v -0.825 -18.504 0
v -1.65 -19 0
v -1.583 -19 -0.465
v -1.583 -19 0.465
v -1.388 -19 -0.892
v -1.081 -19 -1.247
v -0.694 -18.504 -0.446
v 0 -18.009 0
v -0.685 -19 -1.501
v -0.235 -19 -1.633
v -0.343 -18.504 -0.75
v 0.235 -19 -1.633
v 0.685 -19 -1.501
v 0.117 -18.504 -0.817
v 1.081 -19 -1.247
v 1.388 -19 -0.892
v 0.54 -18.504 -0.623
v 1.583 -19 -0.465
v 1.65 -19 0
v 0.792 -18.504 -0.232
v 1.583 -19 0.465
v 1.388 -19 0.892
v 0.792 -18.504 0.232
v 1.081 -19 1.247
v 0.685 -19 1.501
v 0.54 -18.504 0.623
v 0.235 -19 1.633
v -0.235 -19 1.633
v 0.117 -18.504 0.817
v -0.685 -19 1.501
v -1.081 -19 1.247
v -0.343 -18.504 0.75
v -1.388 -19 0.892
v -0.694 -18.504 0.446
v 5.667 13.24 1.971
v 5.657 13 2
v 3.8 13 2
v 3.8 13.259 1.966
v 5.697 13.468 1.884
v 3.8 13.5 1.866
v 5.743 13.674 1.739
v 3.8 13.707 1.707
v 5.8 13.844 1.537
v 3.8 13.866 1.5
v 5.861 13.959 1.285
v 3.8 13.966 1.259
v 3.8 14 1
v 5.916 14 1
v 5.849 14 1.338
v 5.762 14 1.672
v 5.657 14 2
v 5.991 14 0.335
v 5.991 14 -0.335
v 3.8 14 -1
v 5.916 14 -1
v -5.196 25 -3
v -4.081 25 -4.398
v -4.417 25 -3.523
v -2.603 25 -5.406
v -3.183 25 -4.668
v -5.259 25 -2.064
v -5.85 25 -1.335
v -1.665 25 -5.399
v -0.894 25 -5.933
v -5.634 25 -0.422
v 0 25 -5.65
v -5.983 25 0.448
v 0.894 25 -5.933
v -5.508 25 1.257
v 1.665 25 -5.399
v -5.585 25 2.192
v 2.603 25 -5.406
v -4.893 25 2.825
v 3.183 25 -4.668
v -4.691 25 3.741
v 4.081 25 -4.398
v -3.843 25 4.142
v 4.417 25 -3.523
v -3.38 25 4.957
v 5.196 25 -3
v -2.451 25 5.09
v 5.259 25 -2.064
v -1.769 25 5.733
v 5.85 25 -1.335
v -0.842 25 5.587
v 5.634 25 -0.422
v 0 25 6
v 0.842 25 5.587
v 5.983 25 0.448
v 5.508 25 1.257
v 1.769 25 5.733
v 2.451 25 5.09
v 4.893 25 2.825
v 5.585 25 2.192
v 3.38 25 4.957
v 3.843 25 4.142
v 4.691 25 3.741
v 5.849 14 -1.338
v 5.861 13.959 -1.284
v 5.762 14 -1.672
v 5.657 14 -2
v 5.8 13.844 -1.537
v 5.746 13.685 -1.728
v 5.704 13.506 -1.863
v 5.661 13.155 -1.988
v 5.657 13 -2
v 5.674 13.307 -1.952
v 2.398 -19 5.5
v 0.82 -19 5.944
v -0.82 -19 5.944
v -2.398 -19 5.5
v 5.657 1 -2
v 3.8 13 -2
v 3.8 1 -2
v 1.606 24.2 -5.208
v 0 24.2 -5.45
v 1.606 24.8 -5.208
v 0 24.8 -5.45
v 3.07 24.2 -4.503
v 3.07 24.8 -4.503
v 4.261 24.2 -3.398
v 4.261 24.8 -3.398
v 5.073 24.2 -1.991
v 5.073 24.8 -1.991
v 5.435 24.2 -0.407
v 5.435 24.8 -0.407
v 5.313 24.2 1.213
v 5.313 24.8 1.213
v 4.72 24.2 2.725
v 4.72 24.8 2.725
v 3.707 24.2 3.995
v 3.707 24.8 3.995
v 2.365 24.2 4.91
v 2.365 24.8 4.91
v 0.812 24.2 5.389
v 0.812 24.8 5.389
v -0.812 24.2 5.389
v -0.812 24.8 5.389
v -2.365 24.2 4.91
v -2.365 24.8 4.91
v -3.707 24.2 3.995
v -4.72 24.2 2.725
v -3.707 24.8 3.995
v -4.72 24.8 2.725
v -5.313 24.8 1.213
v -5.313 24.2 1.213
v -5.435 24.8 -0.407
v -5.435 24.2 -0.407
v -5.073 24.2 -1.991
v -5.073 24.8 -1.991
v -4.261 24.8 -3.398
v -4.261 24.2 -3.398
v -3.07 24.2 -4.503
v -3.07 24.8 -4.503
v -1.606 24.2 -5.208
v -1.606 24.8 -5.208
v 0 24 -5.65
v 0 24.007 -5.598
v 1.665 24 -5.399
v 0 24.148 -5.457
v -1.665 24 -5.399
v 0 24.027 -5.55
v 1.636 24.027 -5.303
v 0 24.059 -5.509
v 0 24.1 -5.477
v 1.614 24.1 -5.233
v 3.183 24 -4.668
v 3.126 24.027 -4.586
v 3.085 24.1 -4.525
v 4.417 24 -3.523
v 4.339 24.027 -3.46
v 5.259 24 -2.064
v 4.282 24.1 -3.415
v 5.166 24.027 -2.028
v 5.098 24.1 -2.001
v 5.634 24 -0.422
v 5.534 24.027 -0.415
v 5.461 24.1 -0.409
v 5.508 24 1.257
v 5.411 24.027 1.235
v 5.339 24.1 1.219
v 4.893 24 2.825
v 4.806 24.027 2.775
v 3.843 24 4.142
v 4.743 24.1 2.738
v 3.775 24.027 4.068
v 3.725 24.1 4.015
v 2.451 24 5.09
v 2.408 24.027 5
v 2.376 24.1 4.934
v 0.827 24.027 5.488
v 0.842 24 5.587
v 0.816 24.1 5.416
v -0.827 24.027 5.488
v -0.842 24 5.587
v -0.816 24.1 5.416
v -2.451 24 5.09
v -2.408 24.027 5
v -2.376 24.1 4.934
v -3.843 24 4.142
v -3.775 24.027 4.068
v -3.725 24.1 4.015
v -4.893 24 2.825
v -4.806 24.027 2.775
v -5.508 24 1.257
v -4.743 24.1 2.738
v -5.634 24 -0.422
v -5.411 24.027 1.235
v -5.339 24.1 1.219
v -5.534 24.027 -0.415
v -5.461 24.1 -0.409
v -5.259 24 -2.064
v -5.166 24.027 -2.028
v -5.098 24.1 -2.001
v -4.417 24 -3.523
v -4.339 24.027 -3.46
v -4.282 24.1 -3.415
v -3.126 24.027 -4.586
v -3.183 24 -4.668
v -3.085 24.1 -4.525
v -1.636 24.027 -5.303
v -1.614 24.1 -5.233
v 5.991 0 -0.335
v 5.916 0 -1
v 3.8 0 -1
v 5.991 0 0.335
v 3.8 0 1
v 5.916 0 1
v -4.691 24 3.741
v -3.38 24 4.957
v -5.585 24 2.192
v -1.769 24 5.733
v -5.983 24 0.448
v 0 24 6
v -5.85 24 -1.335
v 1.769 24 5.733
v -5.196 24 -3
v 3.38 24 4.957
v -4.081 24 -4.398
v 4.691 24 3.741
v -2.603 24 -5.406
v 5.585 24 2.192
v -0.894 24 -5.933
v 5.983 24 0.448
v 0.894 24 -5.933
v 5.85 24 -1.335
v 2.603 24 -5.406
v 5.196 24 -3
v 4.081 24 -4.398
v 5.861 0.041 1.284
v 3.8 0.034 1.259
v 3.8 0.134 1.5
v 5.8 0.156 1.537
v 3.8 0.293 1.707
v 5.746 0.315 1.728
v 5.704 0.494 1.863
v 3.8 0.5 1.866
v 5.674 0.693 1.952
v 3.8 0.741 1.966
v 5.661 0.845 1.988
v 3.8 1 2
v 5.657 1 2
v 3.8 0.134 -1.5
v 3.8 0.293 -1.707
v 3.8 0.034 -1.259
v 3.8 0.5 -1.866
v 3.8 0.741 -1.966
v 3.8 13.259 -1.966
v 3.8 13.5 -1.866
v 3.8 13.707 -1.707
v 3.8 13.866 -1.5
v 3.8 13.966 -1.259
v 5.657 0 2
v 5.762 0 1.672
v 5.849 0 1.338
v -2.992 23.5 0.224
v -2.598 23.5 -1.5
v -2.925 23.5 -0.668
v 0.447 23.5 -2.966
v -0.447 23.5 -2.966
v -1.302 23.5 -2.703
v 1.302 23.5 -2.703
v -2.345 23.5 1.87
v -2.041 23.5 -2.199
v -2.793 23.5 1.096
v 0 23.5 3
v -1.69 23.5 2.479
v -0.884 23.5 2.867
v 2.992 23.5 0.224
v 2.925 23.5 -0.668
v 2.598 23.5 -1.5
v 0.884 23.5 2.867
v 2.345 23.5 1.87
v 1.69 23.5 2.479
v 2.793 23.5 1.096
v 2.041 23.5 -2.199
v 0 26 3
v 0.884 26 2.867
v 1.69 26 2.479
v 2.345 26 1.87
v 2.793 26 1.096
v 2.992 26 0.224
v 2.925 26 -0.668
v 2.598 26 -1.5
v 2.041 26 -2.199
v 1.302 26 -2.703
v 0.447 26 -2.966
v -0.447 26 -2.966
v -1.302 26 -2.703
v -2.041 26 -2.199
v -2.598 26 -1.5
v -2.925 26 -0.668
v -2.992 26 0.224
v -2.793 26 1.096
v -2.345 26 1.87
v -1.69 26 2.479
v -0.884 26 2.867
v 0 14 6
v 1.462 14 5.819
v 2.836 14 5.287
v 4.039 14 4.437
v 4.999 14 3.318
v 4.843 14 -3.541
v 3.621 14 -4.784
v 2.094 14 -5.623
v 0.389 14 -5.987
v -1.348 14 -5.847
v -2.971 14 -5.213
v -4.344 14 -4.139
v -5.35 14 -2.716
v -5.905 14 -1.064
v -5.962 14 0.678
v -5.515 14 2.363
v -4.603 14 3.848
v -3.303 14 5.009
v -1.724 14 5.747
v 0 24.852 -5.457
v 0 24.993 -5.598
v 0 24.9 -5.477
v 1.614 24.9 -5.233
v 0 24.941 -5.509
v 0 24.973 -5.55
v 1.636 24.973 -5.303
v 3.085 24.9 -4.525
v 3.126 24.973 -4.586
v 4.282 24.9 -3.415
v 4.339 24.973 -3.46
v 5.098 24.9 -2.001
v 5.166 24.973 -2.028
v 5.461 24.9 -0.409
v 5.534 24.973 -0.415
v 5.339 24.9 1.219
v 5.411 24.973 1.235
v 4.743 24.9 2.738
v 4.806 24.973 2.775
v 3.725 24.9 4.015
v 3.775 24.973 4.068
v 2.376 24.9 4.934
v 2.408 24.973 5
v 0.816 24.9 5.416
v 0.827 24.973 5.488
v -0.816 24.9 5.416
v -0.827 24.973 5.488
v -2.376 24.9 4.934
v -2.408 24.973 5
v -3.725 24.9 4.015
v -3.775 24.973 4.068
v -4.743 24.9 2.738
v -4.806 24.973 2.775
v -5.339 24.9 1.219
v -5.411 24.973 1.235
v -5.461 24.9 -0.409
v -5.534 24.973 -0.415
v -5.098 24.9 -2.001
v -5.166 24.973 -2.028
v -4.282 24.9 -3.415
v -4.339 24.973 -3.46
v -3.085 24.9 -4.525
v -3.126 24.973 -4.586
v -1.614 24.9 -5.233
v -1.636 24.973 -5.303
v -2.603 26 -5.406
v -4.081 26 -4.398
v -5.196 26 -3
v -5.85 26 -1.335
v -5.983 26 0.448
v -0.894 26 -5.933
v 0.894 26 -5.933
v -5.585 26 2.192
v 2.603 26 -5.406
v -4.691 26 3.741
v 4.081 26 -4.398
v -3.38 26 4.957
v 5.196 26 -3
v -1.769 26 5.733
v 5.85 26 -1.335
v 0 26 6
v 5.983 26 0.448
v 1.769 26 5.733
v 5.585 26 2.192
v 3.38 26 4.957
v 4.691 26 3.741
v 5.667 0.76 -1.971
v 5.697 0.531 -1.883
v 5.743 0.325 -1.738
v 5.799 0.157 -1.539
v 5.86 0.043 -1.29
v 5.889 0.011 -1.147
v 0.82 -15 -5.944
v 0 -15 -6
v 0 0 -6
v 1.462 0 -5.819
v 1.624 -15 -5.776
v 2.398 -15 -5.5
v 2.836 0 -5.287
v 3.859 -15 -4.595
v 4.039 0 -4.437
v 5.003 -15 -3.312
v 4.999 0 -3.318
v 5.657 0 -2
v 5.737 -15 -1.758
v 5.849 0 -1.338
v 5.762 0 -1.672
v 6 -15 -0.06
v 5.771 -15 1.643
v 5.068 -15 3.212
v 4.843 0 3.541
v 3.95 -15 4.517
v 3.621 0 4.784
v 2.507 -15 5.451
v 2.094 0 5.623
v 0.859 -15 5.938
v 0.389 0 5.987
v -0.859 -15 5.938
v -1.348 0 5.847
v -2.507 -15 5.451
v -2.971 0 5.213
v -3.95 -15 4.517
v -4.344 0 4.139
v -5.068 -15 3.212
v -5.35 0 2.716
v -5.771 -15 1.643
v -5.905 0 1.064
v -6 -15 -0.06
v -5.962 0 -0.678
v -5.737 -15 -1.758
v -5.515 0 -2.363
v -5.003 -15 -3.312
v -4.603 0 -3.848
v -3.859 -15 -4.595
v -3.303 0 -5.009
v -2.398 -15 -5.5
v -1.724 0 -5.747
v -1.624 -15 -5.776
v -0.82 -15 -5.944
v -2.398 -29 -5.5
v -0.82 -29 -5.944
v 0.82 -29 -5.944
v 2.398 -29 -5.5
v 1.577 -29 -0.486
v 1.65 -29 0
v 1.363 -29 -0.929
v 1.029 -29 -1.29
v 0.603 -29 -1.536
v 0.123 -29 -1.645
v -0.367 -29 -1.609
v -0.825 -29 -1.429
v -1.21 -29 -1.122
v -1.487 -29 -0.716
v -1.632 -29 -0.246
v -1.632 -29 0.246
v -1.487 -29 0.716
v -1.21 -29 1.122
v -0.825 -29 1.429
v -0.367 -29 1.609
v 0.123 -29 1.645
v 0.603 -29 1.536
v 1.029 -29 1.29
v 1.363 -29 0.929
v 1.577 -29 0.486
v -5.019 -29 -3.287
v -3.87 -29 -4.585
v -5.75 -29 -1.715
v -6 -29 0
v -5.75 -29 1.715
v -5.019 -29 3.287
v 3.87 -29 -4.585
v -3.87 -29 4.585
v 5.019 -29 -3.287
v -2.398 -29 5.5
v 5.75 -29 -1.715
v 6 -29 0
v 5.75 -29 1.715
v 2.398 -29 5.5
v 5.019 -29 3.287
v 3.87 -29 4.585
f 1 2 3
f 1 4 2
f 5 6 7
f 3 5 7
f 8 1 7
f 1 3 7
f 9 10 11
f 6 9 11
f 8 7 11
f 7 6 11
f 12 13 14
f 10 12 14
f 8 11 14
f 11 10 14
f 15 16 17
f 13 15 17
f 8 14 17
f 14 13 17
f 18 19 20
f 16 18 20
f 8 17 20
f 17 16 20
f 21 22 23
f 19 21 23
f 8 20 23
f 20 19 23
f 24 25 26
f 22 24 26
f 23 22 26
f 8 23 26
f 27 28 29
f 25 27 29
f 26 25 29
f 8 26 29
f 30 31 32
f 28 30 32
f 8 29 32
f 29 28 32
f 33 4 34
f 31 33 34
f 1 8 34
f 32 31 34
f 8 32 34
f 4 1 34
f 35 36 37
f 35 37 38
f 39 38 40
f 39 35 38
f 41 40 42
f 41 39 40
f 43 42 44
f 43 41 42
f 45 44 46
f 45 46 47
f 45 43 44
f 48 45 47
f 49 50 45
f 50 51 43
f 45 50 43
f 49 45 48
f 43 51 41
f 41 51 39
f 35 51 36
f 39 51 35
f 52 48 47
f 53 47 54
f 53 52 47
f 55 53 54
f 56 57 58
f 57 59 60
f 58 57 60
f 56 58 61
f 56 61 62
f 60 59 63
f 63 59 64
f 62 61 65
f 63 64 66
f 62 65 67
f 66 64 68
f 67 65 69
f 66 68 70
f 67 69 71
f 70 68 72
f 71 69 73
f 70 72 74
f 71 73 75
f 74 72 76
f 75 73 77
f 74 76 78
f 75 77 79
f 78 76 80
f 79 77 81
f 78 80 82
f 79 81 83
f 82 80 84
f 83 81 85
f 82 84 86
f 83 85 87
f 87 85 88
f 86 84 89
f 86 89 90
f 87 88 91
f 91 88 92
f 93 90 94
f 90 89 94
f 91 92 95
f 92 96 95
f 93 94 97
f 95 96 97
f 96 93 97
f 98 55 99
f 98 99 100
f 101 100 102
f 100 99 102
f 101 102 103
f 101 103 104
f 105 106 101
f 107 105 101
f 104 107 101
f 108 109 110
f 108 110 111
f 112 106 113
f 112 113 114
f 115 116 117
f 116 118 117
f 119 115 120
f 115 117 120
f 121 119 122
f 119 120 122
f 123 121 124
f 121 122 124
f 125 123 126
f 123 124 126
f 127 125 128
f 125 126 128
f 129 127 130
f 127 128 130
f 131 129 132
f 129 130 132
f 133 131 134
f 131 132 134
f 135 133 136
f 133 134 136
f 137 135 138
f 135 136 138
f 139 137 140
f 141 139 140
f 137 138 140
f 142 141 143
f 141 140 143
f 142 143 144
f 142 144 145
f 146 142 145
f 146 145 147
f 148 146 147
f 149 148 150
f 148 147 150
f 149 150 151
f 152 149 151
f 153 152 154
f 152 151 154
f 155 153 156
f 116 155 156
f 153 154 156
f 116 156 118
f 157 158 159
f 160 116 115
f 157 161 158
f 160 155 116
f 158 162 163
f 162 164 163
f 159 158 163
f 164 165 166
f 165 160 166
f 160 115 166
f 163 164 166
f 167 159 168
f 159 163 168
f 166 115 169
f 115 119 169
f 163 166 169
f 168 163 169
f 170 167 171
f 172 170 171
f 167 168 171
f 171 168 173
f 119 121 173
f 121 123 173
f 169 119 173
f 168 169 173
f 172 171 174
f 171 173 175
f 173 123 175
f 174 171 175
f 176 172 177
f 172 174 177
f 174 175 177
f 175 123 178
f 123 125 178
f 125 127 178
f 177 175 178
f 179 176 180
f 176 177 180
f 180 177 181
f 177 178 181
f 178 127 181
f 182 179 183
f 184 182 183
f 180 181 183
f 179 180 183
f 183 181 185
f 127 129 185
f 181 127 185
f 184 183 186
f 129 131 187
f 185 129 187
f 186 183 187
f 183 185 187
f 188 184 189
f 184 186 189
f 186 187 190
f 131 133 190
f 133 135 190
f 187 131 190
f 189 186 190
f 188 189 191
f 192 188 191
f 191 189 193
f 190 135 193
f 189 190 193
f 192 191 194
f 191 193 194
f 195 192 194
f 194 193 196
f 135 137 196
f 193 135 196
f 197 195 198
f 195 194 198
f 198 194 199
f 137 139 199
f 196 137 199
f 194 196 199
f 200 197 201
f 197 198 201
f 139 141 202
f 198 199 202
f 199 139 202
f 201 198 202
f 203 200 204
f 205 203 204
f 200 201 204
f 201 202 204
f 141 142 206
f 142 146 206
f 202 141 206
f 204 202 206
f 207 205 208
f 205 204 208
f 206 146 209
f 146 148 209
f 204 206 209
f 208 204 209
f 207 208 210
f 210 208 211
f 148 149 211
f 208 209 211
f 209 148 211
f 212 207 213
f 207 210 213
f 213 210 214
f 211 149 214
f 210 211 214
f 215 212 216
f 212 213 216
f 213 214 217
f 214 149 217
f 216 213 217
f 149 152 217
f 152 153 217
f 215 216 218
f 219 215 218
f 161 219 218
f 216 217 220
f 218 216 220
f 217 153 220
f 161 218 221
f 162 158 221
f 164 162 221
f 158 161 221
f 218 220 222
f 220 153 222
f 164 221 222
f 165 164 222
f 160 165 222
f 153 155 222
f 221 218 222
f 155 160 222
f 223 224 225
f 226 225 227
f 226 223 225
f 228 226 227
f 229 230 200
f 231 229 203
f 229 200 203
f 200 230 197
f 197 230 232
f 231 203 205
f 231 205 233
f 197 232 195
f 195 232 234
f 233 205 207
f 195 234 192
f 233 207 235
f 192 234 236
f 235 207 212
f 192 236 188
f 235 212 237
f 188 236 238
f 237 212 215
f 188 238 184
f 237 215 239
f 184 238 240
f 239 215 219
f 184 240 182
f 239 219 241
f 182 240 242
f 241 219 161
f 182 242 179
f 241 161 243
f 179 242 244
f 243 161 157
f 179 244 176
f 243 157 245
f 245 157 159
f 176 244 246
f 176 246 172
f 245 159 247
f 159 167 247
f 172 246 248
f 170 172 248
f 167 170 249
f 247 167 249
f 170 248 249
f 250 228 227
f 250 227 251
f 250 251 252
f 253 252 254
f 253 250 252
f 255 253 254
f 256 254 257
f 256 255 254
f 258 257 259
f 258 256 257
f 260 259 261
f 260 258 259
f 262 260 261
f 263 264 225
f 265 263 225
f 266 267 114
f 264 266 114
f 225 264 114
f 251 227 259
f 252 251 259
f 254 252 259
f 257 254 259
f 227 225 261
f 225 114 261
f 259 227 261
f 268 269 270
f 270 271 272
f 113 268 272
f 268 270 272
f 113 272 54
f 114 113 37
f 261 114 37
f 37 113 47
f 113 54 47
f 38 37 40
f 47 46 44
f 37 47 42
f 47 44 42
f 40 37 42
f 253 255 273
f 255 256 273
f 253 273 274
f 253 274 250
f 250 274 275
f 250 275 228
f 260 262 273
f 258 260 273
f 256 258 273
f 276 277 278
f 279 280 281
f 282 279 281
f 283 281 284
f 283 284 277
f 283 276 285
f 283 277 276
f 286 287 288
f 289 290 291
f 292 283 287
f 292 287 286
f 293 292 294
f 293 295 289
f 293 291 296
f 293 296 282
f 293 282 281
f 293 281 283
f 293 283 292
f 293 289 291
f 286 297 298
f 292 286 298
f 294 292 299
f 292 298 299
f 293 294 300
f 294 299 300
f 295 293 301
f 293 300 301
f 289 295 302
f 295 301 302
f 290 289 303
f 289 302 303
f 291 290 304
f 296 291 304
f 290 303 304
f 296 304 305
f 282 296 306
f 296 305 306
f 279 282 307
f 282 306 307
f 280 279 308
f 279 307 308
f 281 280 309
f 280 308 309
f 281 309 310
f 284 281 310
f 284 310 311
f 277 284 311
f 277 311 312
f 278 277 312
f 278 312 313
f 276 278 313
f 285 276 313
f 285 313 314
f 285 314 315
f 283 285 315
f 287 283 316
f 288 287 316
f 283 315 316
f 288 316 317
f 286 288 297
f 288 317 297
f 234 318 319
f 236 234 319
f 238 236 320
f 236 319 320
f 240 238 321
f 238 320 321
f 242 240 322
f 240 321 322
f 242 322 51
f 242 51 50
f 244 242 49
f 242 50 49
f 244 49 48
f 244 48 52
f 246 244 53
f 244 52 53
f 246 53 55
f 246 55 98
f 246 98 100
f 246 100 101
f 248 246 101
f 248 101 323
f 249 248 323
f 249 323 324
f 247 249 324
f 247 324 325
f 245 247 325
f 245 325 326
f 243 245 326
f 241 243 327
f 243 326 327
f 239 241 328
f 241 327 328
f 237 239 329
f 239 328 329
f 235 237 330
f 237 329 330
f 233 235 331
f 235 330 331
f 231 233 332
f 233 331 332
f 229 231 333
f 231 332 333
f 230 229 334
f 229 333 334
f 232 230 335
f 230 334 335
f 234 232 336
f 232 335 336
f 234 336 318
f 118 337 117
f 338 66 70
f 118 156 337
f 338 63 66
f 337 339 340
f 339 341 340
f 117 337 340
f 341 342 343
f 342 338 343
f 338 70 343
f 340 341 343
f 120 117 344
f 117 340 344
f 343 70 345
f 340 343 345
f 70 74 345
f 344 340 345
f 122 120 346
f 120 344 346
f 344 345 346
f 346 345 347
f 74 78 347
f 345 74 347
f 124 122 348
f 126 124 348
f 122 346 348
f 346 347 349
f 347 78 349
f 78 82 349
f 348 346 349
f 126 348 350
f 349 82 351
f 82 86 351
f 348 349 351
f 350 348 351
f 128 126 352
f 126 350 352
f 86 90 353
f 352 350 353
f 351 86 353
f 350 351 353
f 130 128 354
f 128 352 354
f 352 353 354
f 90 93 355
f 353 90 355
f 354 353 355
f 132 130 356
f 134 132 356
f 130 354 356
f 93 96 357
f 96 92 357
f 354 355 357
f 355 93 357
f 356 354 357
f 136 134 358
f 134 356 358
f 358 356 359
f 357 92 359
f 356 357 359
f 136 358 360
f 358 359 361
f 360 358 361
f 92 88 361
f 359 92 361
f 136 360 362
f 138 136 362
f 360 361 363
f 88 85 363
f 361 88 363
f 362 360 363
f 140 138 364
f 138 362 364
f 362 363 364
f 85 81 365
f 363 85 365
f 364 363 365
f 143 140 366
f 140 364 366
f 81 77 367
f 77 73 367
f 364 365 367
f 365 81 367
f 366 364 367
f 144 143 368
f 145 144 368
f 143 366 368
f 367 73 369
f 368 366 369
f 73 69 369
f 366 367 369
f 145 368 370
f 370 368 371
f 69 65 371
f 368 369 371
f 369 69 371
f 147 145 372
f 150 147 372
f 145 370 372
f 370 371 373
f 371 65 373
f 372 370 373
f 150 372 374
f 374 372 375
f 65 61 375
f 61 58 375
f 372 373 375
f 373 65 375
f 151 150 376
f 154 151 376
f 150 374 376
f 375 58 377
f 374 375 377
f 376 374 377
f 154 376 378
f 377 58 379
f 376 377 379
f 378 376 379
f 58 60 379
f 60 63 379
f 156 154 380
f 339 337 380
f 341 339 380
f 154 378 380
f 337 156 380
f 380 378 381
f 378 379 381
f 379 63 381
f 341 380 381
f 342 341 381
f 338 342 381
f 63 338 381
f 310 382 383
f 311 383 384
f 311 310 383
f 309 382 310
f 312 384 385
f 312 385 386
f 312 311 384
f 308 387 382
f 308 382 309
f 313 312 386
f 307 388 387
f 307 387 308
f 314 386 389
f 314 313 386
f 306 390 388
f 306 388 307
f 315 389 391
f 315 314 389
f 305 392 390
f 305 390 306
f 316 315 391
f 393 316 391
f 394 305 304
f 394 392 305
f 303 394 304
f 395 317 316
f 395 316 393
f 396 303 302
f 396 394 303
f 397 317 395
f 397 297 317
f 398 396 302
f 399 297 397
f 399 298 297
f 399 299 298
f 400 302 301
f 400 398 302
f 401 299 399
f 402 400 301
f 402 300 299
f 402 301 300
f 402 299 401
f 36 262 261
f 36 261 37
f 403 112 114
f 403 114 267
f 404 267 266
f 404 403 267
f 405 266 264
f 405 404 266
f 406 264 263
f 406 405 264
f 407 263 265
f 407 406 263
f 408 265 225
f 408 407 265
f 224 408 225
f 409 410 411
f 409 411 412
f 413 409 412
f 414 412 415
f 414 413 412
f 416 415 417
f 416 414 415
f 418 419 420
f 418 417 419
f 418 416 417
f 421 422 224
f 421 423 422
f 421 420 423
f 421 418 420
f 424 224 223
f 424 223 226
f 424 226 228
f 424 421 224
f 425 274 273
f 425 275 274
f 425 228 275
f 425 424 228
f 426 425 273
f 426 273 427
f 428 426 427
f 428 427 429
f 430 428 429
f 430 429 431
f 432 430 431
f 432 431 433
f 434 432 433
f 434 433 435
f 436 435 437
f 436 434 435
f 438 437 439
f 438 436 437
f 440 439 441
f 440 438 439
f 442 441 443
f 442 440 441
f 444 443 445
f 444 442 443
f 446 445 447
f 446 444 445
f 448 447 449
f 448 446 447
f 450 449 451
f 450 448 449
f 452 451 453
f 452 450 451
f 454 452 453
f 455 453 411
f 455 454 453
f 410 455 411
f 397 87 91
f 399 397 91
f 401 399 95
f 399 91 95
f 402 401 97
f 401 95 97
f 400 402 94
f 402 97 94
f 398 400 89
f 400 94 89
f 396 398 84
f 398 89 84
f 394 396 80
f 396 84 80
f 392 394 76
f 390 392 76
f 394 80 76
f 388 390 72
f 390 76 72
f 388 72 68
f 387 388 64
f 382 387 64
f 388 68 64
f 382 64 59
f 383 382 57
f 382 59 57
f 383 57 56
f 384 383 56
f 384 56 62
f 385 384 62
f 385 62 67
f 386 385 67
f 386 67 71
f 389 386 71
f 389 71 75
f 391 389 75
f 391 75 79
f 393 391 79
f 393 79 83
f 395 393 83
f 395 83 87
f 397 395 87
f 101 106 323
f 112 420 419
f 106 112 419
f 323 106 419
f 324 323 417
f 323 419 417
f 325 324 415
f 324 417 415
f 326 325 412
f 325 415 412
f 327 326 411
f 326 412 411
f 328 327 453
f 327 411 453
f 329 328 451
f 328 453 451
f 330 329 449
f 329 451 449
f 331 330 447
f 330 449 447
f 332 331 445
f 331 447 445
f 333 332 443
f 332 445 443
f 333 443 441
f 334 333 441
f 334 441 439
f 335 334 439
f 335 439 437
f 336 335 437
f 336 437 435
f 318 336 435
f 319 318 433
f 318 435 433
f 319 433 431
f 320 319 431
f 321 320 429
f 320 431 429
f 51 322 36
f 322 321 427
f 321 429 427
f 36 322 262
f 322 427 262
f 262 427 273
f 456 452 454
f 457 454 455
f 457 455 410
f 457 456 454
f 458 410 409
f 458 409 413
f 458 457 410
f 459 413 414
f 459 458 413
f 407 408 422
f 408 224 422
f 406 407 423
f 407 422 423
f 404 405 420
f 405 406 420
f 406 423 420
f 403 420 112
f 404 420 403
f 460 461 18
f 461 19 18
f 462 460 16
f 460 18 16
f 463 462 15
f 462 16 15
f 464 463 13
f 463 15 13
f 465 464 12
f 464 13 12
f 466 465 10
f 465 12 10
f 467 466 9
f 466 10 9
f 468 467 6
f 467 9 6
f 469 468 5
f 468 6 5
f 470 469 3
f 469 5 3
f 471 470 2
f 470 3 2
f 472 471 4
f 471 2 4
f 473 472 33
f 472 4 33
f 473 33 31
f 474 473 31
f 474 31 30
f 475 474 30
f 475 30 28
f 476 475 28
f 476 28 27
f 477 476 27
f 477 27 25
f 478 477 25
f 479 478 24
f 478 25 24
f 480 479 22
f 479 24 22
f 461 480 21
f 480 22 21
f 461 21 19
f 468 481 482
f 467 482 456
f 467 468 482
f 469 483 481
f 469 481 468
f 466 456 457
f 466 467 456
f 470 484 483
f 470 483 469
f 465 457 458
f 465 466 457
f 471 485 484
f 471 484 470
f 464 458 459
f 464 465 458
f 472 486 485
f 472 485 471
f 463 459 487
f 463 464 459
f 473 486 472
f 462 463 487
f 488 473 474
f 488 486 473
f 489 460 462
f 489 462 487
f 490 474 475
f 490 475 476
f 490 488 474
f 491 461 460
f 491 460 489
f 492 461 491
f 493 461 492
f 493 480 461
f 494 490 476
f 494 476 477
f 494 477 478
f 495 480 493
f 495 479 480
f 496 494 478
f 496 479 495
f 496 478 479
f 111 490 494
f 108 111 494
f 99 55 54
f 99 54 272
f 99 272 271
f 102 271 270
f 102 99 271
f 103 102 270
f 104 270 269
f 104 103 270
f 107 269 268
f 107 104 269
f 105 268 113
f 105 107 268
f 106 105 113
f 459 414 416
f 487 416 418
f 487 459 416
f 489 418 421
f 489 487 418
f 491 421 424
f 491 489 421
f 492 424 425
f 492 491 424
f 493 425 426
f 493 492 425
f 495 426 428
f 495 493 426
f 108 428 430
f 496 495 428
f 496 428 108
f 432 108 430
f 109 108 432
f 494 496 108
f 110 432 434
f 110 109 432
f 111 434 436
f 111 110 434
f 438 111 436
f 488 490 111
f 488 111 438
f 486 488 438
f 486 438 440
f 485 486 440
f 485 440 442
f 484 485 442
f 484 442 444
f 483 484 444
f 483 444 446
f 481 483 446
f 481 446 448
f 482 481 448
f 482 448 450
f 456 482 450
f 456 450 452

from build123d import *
from build123d.topology import SkipClean

# Parameters (mm, degrees)
BOSS_EXTRUDE1_DEPTH   = 14
SKETCH2_R             = 6
BOSS_EXTRUDE2_DEPTH   = 12
BOSS_EXTRUDE3_START   = 15
SKETCH3_R             = 6
BOSS_EXTRUDE3_DEPTH   = 15
CUT_EXTRUDE1_DEPTH    = 2.2
BOSS_EXTRUDE4_START   = 14
BOSS_EXTRUDE4_DEPTH   = 14
CUT_EXTRUDE2_DEPTH    = 10
SKETCH24_R            = 3
CUT_EXTRUDE3_DEPTH    = 2.5
M4_TAPPED_HOLE1_D     = 3.3
M4_TAPPED_HOLE1_DEPTH = 10
M4_TAPPED_HOLE1_TIP   = 0.991420021


with BuildPart() as part:
    # Sketch1 → Boss-Extrude1 (new body)
    with BuildSketch(Plane(origin=(0, 0, 0), x_dir=(1, 0, 0), z_dir=(0, 1, 0))):
        with BuildLine():
            ThreePointArc((5.656854249, 2), (-6, 0), (5.656854249, -2))
            ThreePointArc((5.656854249, -2), (6, 0), (5.656854249, 2))
        make_face()
    extrude(amount=BOSS_EXTRUDE1_DEPTH)

    # Sketch2 → Boss-Extrude2 (add)
    with BuildSketch(Plane(origin=(0, 14, 0), x_dir=(1, 0, 0), z_dir=(0, 1, 0))):
        with Locations(Location((0, 0, 0), (0, 0, 270))):
            Circle(SKETCH2_R)
    extrude(amount=BOSS_EXTRUDE2_DEPTH)

    # Sketch3 → Boss-Extrude3 (add)
    with BuildSketch(Plane.XZ.offset(BOSS_EXTRUDE3_START)):
        with Locations(Location((0, 0, 0), (0, 0, 270))):
            Circle(SKETCH3_R)
    extrude(amount=-BOSS_EXTRUDE3_DEPTH)

    # Groove Sketch → Retaining Ring Groove (revolve, cut)
    with BuildSketch(Plane(origin=(1.604252923, 12.182890291, 0.373259529), x_dir=(-0.9343262431877186, 0.2824476966643587, -0.2173885230174828), z_dir=(-0.2266157025474993, 0, 0.9739842521103221)), mode=Mode.PRIVATE) as retaining_ring_groove_sk:
        with BuildLine():
            Line((10.620148315, -10.234181518), (12.083054432, -9.80344878))
            Line((12.083054432, -9.80344878), (11.800606735, -8.84416608))
            Line((11.800606735, -8.84416608), (10.337700618, -9.274898818))
            ThreePointArc((10.337700618, -9.274898818), (10.21858296, -9.371036434), (10.202333617, -9.523244897))
            Line((10.202333617, -9.523244897), (10.371802235, -10.098814517))
            ThreePointArc((10.371802235, -10.098814517), (10.467939851, -10.217932175), (10.620148315, -10.234181518))
        make_face()
    revolve(retaining_ring_groove_sk.sketch.rotate(Axis((0, 60.224615576, 0), (0, -1, 0)), 76.902094509), axis=Axis((0, 60.224615576, 0), (0, -1, 0)), mode=Mode.SUBTRACT)

    # Sketch21 → Cut-Extrude1 (cut)
    with SkipClean():  # the faces are left unmerged after this step: merging them gives an invalid solid
        with BuildSketch(Plane(origin=(6, 0, 0), x_dir=(0, 0, -1), z_dir=(1, 0, 0))):
            with BuildLine():
                Line((-1, 14), (1, 14))
                ThreePointArc((1, 14), (1.707106781, 13.707106781), (2, 13))
                Line((2, 13), (2, 1))
                ThreePointArc((2, 1), (1.707106781, 0.292893219), (1, 0))
                Line((1, 0), (-1, 0))
                ThreePointArc((-1, 0), (-1.707106781, 0.292893219), (-2, 1))
                Line((-2, 1), (-2, 13))
                ThreePointArc((-2, 13), (-1.707106781, 13.707106781), (-1, 14))
            make_face()
        extrude(amount=-CUT_EXTRUDE1_DEPTH, mode=Mode.SUBTRACT)

    # Sketch22 → Boss-Extrude4 (add)
    with SkipClean():  # the faces are left unmerged after this step: merging them gives an invalid solid
        with BuildSketch(Plane.XZ.offset(15).offset(BOSS_EXTRUDE4_START)):
            with BuildLine():
                ThreePointArc((2.397915762, -5.5), (0, 6), (-2.397915762, -5.5))
                ThreePointArc((-2.397915762, -5.5), (0, -6), (2.397915762, -5.5))
            make_face()
        extrude(amount=-BOSS_EXTRUDE4_DEPTH)

    # Sketch23 → Cut-Extrude2 (cut)
    with SkipClean():  # the faces are left unmerged after this step: merging them gives an invalid solid
        with BuildSketch(Plane.XZ.offset(29)):
            with BuildLine():
                Line((-2.397915762, 5.5), (2.397915762, 5.5))
                ThreePointArc((2.397915762, 5.5), (0, 6), (-2.397915762, 5.5))
            make_face()
        extrude(amount=-CUT_EXTRUDE2_DEPTH, mode=Mode.SUBTRACT)

    # Sketch24 → Cut-Extrude3 (cut)
    with SkipClean():  # the faces are left unmerged after this step: merging them gives an invalid solid
        with BuildSketch(Plane(origin=(0, 26, 0), x_dir=(1, 0, 0), z_dir=(0, 1, 0))):
            with Locations(Location((0, 0, 0), (0, 0, 270))):
                Circle(SKETCH24_R)
        extrude(amount=-CUT_EXTRUDE3_DEPTH, mode=Mode.SUBTRACT)

    # M4 Tapped Hole1
    with Locations(Plane(origin=(0, -29, 0), x_dir=(-1, 0, 0), z_dir=(0, -1, 0))):
        with Locations((0, 0)):
            Hole(M4_TAPPED_HOLE1_D / 2, depth=M4_TAPPED_HOLE1_DEPTH)
            with Locations((0, 0, -(M4_TAPPED_HOLE1_DEPTH + M4_TAPPED_HOLE1_TIP / 2))):  # 118° drill point
                Cone(0, M4_TAPPED_HOLE1_D / 2, M4_TAPPED_HOLE1_TIP, mode=Mode.SUBTRACT)


solid = part.part
